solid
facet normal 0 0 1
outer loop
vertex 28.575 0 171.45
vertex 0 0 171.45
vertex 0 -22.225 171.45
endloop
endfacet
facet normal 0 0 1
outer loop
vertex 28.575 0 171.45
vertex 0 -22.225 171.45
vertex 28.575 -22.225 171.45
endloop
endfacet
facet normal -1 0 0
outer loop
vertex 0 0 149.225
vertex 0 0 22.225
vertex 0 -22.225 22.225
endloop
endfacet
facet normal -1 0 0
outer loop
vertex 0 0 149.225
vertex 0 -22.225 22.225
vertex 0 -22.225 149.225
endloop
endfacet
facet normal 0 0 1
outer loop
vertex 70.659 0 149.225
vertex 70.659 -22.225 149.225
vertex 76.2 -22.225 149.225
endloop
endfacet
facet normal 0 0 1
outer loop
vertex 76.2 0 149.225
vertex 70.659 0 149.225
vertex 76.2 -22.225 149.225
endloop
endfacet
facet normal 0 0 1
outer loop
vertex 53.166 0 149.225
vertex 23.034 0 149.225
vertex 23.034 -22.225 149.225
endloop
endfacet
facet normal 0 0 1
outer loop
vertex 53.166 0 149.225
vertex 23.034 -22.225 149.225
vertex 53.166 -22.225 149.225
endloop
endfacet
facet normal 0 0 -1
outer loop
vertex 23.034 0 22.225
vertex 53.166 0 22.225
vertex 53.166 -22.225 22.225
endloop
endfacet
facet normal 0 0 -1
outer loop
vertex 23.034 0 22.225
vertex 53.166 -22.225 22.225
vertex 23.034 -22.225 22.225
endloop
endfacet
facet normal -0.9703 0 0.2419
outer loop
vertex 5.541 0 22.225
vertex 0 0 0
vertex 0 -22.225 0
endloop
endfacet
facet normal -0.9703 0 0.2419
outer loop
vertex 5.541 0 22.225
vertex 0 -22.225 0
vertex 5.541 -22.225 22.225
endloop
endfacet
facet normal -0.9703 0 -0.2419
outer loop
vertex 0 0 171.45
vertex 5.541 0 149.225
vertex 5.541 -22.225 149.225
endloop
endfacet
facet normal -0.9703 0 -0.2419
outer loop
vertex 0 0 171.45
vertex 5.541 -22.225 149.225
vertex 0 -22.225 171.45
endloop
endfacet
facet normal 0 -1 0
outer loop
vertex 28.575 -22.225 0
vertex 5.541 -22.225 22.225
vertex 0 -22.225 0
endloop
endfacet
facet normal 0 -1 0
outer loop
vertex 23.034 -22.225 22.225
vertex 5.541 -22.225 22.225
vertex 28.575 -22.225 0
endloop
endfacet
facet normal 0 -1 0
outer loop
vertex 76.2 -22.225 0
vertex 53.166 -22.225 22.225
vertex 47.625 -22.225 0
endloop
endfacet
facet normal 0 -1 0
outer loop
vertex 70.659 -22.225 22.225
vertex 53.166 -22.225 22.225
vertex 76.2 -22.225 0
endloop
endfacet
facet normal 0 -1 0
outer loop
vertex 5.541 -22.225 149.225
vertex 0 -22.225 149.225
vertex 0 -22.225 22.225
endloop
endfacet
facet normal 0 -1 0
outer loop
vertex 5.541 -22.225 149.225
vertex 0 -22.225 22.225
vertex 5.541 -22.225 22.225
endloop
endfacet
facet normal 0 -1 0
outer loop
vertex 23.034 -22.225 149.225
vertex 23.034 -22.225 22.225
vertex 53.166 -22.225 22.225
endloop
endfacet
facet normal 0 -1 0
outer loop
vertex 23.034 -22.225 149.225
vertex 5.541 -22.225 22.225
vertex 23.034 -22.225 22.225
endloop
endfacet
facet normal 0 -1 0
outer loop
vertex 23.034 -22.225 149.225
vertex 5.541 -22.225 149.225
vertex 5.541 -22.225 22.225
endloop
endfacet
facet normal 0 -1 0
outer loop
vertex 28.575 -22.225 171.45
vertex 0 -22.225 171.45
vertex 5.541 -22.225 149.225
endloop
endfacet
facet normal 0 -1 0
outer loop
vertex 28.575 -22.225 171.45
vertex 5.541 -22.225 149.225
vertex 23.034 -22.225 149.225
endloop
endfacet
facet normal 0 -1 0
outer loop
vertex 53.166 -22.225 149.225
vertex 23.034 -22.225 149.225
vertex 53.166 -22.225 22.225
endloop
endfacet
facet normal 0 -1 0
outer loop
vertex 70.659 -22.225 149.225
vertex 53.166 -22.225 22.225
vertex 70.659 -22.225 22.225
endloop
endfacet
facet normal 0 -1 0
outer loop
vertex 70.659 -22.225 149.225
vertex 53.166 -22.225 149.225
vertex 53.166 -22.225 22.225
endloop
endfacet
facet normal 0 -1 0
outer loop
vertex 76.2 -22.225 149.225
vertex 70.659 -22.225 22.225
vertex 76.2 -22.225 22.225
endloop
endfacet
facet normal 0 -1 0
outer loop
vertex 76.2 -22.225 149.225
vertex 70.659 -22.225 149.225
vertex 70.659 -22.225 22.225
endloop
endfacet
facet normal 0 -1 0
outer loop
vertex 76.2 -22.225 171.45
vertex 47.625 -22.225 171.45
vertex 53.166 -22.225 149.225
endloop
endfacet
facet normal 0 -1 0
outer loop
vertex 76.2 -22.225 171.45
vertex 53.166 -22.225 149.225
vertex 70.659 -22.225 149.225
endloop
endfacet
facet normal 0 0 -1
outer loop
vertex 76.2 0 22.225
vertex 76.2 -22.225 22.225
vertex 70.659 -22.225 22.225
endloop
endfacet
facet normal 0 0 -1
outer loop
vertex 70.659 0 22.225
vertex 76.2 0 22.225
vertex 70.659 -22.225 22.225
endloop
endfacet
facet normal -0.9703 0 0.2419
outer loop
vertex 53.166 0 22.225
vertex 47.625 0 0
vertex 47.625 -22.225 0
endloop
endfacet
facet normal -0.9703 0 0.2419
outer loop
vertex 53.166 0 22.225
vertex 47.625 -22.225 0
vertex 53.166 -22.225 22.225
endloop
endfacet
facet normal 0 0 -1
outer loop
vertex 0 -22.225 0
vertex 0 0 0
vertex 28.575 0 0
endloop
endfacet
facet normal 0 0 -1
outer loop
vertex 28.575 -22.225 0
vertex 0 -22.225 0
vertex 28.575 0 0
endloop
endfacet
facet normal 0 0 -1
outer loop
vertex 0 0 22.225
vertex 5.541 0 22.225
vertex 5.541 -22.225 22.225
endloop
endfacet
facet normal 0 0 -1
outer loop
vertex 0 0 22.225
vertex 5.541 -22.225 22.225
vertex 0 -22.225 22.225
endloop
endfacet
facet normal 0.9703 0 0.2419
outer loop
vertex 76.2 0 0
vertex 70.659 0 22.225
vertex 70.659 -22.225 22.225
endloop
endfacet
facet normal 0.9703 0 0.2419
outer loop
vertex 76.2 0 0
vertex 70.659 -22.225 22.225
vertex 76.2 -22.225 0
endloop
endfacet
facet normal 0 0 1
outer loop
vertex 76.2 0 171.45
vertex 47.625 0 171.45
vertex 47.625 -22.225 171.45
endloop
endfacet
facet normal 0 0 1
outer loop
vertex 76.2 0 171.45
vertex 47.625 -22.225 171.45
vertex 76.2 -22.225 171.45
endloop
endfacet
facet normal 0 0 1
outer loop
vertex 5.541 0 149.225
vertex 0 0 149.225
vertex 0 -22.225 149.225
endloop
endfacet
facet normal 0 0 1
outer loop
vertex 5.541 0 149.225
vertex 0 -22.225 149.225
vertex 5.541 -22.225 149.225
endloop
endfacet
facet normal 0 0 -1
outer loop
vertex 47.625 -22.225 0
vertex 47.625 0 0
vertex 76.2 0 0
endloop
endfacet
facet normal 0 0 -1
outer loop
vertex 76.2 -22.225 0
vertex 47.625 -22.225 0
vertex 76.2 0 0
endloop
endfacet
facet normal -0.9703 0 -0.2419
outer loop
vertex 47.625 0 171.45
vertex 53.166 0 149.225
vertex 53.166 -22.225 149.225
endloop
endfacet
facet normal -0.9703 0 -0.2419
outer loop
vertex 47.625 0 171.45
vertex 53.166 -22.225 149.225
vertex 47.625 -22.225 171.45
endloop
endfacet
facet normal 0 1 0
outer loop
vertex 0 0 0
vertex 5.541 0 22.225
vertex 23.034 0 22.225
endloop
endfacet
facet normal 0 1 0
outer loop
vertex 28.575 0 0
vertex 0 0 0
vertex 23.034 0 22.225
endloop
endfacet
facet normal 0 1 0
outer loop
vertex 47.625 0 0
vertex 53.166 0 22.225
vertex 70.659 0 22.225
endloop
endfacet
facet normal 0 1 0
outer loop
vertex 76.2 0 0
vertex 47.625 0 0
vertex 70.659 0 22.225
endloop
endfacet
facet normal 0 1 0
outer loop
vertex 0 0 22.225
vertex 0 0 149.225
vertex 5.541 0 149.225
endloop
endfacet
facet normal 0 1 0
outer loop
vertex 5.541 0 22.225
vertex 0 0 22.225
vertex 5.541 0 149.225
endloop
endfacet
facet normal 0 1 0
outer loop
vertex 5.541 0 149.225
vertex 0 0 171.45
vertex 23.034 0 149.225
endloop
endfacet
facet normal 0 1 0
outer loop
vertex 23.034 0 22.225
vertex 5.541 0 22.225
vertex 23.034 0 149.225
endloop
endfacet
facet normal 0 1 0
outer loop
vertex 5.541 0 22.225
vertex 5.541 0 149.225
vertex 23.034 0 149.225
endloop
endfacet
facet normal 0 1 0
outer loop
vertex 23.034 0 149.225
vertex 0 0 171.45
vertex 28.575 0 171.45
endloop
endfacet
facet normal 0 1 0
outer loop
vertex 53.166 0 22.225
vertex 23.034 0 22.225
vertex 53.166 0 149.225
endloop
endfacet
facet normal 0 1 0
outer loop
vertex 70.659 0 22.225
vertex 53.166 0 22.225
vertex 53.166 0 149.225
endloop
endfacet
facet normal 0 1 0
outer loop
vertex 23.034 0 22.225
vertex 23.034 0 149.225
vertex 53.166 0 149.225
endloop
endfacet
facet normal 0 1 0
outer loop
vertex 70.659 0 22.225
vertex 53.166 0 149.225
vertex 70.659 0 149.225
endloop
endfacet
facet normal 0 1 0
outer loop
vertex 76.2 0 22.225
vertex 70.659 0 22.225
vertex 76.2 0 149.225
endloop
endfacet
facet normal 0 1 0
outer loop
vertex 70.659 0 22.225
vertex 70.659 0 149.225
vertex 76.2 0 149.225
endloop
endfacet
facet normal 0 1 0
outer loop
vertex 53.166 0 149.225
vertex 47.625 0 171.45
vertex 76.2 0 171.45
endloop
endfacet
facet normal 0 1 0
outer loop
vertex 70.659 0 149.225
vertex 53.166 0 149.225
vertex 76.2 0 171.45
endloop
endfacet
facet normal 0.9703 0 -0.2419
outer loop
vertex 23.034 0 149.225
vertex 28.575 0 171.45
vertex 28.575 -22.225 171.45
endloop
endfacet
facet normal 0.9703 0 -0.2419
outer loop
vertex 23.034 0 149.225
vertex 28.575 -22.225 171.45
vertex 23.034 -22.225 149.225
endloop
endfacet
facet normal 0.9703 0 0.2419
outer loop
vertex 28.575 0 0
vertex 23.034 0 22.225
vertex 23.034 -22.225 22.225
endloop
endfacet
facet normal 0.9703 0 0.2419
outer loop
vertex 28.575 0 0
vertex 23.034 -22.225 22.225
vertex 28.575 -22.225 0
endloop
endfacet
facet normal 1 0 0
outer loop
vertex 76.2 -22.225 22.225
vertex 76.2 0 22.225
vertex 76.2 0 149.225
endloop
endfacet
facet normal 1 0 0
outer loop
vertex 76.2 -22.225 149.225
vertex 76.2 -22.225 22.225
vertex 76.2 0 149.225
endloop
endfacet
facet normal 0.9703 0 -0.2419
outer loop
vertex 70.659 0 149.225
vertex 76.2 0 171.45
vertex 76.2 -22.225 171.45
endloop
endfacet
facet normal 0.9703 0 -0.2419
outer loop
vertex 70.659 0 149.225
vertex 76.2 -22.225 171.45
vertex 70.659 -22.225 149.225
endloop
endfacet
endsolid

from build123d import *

# Parameters (mm, degrees)
F0_W     = 76.2
F0_H     = 171.45
F1_DEPTH = 22.225
F3_DEPTH = 22.226


with BuildPart() as f1:
    # F0 (on Front) → F1 (new body)
    with BuildSketch(Plane.XZ):
        with Locations((38.1, 85.725)):
            Rectangle(F0_W, F0_H)
    extrude(amount=F1_DEPTH)

    # F2 (on Front) → F3 (cut, through all)
    with BuildSketch(Plane.XZ):
        Polygon((28.575, 171.45), (23.033685, 149.225), (53.166315, 149.225), (47.625, 171.45), align=None)
        Polygon((76.2, 149.225), (76.2, 171.45), (70.658685, 149.225), align=None)
        Polygon((5.541315, 149.225), (0, 171.45), (0, 149.225), align=None)
        Polygon((70.658685, 22.225), (76.2, 0), (76.2, 22.225), align=None)
        Polygon((53.166315, 22.225), (23.033685, 22.225), (28.575, 0), (47.625, 0), align=None)
        Polygon((0, 22.225), (0, 0), (5.541315, 22.225), align=None)
    extrude(amount=F3_DEPTH, mode=Mode.SUBTRACT)


solid = f1.part
